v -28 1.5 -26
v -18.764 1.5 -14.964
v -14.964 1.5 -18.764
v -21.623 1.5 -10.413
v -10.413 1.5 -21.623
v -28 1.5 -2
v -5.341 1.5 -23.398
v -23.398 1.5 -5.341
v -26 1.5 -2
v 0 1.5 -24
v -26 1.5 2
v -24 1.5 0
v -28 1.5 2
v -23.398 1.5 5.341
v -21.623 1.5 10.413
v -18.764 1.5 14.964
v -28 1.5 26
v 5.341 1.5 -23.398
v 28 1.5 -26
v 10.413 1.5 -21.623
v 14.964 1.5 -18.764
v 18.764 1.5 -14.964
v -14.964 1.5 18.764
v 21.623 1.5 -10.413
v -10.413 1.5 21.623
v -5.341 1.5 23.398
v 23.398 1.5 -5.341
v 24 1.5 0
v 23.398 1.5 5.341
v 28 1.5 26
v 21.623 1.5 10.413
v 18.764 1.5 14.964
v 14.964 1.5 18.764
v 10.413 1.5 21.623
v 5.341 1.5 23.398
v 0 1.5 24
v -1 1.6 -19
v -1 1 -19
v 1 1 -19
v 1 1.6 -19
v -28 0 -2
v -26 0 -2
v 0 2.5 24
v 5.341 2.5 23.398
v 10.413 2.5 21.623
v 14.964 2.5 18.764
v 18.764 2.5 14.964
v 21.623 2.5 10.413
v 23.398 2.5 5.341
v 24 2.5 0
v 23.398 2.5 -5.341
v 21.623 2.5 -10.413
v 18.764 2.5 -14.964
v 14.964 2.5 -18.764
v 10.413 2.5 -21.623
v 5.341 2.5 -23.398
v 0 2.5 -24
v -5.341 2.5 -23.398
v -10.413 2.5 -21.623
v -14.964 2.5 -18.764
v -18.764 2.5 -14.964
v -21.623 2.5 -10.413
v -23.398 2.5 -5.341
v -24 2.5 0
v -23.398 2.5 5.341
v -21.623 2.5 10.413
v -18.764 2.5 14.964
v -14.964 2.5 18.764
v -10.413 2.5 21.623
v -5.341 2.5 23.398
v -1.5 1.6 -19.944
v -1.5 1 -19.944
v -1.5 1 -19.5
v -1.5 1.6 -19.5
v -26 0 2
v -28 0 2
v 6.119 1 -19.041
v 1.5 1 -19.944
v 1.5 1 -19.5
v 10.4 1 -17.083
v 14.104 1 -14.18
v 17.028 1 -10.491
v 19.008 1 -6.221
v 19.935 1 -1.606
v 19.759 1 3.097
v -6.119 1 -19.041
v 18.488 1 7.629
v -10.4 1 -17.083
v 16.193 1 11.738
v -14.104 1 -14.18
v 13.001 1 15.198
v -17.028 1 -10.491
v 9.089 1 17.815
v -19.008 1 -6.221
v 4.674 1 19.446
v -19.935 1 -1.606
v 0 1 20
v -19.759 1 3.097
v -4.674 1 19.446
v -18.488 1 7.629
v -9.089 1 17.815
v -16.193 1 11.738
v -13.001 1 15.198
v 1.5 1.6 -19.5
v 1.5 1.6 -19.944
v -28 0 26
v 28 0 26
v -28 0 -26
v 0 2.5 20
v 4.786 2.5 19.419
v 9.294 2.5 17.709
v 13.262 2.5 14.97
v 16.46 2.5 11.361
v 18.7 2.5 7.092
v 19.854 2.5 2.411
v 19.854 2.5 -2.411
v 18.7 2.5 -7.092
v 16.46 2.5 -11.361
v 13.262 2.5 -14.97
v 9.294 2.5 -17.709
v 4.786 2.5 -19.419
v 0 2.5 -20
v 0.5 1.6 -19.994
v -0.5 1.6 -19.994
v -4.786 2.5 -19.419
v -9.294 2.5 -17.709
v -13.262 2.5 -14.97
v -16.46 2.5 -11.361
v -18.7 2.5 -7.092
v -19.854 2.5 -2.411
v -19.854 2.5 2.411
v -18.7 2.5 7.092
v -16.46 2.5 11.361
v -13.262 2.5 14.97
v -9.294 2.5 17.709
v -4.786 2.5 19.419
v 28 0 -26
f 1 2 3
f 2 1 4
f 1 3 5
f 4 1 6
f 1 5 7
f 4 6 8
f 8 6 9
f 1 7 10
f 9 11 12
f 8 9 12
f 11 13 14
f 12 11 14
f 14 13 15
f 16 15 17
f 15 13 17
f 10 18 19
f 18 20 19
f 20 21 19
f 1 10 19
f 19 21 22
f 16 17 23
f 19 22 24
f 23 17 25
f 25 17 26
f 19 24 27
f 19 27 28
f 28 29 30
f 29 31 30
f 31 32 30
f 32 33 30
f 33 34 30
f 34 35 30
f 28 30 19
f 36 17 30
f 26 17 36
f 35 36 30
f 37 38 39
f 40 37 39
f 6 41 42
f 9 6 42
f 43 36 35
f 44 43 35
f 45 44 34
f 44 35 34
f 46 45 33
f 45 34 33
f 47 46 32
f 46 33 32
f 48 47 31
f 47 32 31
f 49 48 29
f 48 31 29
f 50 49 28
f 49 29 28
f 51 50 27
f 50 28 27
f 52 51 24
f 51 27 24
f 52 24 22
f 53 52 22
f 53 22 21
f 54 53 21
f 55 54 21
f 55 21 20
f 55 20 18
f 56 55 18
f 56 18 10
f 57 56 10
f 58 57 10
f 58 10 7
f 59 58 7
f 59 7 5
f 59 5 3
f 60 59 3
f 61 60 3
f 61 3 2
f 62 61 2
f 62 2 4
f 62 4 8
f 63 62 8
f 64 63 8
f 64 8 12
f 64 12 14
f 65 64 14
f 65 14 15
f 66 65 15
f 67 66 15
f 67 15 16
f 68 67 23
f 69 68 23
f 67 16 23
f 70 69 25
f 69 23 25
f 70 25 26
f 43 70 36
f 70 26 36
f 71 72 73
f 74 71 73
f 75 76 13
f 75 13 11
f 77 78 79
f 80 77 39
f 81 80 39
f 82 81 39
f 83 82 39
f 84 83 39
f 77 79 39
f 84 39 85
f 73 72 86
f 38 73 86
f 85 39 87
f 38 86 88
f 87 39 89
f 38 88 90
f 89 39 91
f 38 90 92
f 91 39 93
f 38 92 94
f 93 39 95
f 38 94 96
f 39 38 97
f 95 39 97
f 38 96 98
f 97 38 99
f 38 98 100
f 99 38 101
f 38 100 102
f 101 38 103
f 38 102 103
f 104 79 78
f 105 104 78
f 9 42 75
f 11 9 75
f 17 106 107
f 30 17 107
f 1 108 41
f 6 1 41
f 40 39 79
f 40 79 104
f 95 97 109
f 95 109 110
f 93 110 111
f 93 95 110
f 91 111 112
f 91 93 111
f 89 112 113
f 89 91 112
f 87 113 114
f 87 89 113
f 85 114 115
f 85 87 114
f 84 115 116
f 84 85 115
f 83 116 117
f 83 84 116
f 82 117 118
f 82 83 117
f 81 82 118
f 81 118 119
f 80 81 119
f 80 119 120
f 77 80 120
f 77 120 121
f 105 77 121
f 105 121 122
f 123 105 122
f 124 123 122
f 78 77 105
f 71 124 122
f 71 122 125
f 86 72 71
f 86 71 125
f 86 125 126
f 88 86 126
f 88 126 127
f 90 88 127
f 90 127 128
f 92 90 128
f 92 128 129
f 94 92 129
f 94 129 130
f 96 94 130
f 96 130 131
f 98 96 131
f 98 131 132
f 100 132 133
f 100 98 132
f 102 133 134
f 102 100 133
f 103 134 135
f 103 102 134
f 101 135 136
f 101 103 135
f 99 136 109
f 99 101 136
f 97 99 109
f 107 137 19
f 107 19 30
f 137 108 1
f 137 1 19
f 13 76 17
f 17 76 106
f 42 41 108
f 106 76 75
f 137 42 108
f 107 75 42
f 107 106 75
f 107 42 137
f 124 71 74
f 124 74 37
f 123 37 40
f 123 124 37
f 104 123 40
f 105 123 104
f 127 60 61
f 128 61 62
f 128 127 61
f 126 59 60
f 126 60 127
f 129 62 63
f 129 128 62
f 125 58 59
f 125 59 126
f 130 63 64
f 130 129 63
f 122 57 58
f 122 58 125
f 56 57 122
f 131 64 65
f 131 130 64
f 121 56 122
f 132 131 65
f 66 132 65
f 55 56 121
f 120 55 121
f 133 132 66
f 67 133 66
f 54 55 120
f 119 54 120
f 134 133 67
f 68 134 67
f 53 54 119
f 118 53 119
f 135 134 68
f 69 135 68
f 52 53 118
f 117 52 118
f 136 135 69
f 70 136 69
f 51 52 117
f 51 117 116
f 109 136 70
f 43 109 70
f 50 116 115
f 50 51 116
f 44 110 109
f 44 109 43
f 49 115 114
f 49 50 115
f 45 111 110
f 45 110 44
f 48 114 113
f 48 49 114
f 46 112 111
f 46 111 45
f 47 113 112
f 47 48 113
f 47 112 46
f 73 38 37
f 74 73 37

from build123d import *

# Parameters (mm, degrees)
SKETCH1_R           = 24
SKETCH1_R_2         = 20
BOSS_EXTRUDE1_DEPTH = 2.5
SKETCH2_R           = 24
BOSS_EXTRUDE2_DEPTH = 1
SKETCH3_W           = 56
SKETCH3_H           = 52
SKETCH3_R           = 24
BOSS_EXTRUDE3_DEPTH = 1.5
BOSS_EXTRUDE4_DEPTH = 0.6
CHAMFER1_SIZE       = 0.5
SKETCH5_W           = 18.188296091
SKETCH5_H           = 4
CUT_EXTRUDE1_DEPTH  = 39.291643997


with BuildPart() as part:
    # Sketch1 → Boss-Extrude1 (new body)
    with BuildSketch(Plane(origin=(0, 0, 0), x_dir=(1, 0, 0), z_dir=(0, 1, 0))):
        with Locations(Location((0, 0, 0), (0, 0, 270))):
            Circle(SKETCH1_R)
        with Locations(Location((0, 0, 0), (0, 0, 270))):
            Circle(SKETCH1_R_2, mode=Mode.SUBTRACT)
    extrude(amount=BOSS_EXTRUDE1_DEPTH)

    # Sketch2 → Boss-Extrude2 (add)
    with BuildSketch(Plane.XZ):
        with Locations(Location((0, 0, 0), (0, 0, 90))):
            Circle(SKETCH2_R)
    extrude(amount=-BOSS_EXTRUDE2_DEPTH)

    # Sketch3 → Boss-Extrude3 (add)
    with BuildSketch(Plane.XZ):
        Rectangle(SKETCH3_W, SKETCH3_H)
        with Locations(Location((0, 0, 0), (0, 0, 270))):
            Circle(SKETCH3_R, mode=Mode.SUBTRACT)
    extrude(amount=-BOSS_EXTRUDE3_DEPTH)

    # Sketch4 → Boss-Extrude4 (add)
    with BuildSketch(Plane(origin=(0, 1, 0), x_dir=(1, 0, 0), z_dir=(0, 1, 0))):
        with BuildLine():
            Line((1.5, 19), (1.5, 19.943670675))
            ThreePointArc((1.5, 19.943670675), (0, 20), (-1.5, 19.943670675))
            Line((-1.5, 19.943670675), (-1.5, 19))
            Line((-1.5, 19), (1.5, 19))
        make_face()
    extrude(amount=BOSS_EXTRUDE4_DEPTH)

    # Chamfer1
    chamfer1_edges = [part.edges().sort_by_distance(p)[0] for p in [
        (-1.5, 1.3, -19),
        (1.5, 1.3, -19),
    ]]
    chamfer(chamfer1_edges, length=CHAMFER1_SIZE)

    # Sketch5 → Cut-Extrude1 (cut, through all)
    with BuildSketch(Plane.XZ):
        with Locations((-35.094148046, 0)):
            Rectangle(SKETCH5_W, SKETCH5_H)
    extrude(amount=-CUT_EXTRUDE1_DEPTH, mode=Mode.SUBTRACT)


solid = part.part
